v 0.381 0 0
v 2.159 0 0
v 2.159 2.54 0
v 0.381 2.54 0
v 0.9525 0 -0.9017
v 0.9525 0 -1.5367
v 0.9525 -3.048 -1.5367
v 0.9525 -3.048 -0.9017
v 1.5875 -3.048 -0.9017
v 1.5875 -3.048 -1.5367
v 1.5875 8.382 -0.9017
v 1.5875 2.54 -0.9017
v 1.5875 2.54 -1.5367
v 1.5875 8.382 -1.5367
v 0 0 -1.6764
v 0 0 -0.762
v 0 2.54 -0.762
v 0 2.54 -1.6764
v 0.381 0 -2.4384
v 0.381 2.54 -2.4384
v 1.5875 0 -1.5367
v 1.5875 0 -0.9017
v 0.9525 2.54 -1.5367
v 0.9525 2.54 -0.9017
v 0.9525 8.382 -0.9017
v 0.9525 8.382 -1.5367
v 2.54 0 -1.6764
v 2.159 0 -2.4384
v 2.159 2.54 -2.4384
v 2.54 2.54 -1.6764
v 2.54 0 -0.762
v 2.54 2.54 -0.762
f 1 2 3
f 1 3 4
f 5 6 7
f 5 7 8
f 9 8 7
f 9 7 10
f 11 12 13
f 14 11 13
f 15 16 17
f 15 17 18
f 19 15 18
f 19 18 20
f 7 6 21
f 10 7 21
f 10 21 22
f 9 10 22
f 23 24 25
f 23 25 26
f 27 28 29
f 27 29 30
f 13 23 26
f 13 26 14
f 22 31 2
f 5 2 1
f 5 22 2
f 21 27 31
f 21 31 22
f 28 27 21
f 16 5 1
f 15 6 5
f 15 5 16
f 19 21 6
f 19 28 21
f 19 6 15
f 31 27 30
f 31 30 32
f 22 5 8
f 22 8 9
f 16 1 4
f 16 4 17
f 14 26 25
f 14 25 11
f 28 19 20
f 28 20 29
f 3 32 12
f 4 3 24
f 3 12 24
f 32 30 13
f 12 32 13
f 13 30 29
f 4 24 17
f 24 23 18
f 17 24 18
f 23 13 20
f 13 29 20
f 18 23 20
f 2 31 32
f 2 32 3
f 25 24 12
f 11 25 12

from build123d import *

# Parameters (mm, degrees)
BOSS_EXTRUDE1_DEPTH = 2.54
SKETCH2_W           = 0.635
SKETCH2_H           = 0.635
BOSS_EXTRUDE2_DEPTH = 5.842
SKETCH5_W           = 0.635
SKETCH5_H           = 0.635
BOSS_EXTRUDE3_DEPTH = 3.048


with BuildPart() as part:
    # Sketch1 → Boss-Extrude1 (new body)
    with BuildSketch(Plane(origin=(0, 0, 0), x_dir=(1, 0, 0), z_dir=(0, 1, 0))):
        Polygon((0.381, 0), (0, 0.762), (0, 1.6764), (0.381, 2.4384), (2.159, 2.4384), (2.54, 1.6764), (2.54, 0.762), (2.159, 0), align=None)
    extrude(amount=BOSS_EXTRUDE1_DEPTH)

    # Sketch2 → Boss-Extrude2 (add)
    with BuildSketch(Plane(origin=(0, 2.54, 0), x_dir=(1, 0, 0), z_dir=(0, 1, 0))):
        with Locations((1.27, 1.2192)):
            Rectangle(SKETCH2_W, SKETCH2_H)
    extrude(amount=BOSS_EXTRUDE2_DEPTH)

    # Sketch5 → Boss-Extrude3 (add)
    with BuildSketch(Plane.XZ):
        with Locations((1.27, -1.2192)):
            Rectangle(SKETCH5_W, SKETCH5_H)
    extrude(amount=BOSS_EXTRUDE3_DEPTH)


solid = part.part
